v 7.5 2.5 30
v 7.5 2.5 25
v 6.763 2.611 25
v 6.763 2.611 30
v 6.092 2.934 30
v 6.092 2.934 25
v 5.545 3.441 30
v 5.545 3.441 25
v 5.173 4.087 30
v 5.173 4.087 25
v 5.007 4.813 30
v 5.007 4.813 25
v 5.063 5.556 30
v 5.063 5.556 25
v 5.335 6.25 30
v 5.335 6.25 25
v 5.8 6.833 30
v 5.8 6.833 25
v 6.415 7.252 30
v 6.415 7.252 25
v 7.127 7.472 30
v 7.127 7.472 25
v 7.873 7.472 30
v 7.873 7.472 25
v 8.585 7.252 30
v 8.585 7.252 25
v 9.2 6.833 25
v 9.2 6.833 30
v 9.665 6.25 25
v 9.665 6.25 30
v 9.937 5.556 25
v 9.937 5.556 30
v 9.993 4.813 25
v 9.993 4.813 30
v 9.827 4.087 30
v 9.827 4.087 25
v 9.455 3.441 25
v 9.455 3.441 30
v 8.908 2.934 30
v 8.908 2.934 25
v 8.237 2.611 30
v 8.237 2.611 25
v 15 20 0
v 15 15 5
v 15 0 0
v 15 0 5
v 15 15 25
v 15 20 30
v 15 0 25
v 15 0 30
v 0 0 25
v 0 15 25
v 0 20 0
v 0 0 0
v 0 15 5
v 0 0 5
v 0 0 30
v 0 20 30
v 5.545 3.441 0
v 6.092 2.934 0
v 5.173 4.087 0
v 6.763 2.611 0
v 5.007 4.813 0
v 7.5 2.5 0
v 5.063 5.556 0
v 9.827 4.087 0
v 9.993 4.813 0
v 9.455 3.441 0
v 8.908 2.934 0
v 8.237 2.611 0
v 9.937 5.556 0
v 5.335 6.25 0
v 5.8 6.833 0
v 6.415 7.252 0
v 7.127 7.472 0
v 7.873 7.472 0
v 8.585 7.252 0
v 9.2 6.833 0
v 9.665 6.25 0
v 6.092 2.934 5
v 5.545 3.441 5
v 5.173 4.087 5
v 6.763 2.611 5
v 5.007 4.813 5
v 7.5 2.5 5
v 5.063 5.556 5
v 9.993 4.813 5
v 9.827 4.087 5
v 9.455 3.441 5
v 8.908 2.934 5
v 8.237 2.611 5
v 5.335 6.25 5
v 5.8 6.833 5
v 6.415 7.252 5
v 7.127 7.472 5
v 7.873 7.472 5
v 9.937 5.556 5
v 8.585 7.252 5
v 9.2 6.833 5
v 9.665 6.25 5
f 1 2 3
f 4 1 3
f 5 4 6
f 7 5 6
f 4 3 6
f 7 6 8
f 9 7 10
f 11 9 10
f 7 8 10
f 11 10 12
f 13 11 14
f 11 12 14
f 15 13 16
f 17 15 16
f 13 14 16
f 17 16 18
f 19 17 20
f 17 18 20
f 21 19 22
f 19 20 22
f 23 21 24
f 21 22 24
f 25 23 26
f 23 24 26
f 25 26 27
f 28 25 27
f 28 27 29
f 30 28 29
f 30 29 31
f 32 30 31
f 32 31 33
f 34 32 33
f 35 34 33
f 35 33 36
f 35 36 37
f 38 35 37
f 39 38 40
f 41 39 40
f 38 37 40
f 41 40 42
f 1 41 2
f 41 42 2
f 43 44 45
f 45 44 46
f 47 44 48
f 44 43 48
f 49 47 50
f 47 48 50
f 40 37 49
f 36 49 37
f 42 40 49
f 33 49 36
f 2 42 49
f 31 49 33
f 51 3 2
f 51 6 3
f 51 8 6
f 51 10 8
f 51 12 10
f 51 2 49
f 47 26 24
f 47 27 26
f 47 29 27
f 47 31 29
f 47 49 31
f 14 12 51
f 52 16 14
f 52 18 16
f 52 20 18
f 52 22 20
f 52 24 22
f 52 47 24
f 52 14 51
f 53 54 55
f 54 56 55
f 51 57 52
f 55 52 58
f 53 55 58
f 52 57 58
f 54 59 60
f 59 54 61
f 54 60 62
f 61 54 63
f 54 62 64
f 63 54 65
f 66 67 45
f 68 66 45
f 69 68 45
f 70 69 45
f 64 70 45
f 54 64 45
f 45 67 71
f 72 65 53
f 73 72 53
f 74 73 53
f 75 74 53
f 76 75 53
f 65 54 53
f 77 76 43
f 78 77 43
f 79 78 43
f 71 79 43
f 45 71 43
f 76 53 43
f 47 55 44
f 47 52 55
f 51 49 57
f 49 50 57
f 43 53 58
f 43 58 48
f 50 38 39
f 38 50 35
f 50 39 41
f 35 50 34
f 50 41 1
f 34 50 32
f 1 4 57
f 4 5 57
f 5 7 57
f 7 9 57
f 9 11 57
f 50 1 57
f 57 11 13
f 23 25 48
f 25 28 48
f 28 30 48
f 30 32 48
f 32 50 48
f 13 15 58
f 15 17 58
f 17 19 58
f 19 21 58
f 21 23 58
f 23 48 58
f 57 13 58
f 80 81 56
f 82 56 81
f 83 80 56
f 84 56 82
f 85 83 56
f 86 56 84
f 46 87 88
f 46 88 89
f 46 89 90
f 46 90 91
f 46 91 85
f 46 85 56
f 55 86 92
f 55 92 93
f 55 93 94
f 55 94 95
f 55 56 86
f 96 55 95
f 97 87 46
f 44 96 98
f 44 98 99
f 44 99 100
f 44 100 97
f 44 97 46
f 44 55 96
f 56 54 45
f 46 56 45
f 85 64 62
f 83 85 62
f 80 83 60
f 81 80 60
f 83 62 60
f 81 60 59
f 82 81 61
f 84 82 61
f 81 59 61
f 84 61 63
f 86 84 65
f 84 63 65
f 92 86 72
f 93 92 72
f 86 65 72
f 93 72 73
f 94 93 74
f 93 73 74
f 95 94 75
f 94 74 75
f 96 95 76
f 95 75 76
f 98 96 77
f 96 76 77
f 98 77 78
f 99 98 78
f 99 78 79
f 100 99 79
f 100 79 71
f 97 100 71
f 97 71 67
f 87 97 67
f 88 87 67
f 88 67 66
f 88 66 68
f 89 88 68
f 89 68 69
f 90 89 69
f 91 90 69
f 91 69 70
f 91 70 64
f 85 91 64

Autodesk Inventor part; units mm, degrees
ref_plane "YZ Plane" through (0, 0, 0) normal (1, 0, 0) x (0, 1, 0)
ref_plane "XZ Plane" through (0, 0, 0) normal (0, 1, 0) x (-1, 0, 0)
ref_plane "XY Plane" through (0, 0, 0) normal (0, 0, 1) x (1, 0, 0)
sketch "Эскиз1" plane through (0, 0, 0) normal (0, 0, 1) x (1, 0, 0)
  line L0 (0, 0) -> (15, 0)
  line L1 (15, 0) -> (15, 20)
  line L2 (15, 20) -> (0, 20)
  line L3 (0, 20) -> (0, 0)
  dimension "d0" = 15
  dimension "d1" = 20
extrude "Выдавливание1" add sketch "Эскиз1" along normal blind 5
sketch "Эскиз2" plane through (0, 0, 5) normal (0, 0, 1) x (1, 0, 0)
  line L0 (0, 20) -> (0, 0) projected
  line L1 (15, 0) -> (15, 20) projected
  line L2 (0, 20) -> (15, 20)
  line L3 (15, 20) -> (15, 15)
  line L4 (15, 15) -> (0, 15)
  line L5 (0, 15) -> (0, 20)
  point P0 (15, 20)
  point P1 (0, 15)
  dimension "d4" = 5
extrude "Выдавливание2" add sketch "Эскиз2" along normal blind 10
mirror "Зеркальное отражение1" about plane through (7.5, 17.5, 15) normal (0, 0, 1) of "Выдавливание2", "Выдавливание1"
sketch "Эскиз3" plane through (0, 0, 5) normal (0, 0, 1) x (1, 0, 0)
  line L0 (0, 0) -> (15, 0) projected
  line L1 (7.5, 0) -> (7.5, 5)
  dimension "d7" = 5
hole "Отверстие1" at (7.5, 5, 5) direction (0, 0, -1) diameter 5 end through all both
properties part number "Поворотный рычаг"
